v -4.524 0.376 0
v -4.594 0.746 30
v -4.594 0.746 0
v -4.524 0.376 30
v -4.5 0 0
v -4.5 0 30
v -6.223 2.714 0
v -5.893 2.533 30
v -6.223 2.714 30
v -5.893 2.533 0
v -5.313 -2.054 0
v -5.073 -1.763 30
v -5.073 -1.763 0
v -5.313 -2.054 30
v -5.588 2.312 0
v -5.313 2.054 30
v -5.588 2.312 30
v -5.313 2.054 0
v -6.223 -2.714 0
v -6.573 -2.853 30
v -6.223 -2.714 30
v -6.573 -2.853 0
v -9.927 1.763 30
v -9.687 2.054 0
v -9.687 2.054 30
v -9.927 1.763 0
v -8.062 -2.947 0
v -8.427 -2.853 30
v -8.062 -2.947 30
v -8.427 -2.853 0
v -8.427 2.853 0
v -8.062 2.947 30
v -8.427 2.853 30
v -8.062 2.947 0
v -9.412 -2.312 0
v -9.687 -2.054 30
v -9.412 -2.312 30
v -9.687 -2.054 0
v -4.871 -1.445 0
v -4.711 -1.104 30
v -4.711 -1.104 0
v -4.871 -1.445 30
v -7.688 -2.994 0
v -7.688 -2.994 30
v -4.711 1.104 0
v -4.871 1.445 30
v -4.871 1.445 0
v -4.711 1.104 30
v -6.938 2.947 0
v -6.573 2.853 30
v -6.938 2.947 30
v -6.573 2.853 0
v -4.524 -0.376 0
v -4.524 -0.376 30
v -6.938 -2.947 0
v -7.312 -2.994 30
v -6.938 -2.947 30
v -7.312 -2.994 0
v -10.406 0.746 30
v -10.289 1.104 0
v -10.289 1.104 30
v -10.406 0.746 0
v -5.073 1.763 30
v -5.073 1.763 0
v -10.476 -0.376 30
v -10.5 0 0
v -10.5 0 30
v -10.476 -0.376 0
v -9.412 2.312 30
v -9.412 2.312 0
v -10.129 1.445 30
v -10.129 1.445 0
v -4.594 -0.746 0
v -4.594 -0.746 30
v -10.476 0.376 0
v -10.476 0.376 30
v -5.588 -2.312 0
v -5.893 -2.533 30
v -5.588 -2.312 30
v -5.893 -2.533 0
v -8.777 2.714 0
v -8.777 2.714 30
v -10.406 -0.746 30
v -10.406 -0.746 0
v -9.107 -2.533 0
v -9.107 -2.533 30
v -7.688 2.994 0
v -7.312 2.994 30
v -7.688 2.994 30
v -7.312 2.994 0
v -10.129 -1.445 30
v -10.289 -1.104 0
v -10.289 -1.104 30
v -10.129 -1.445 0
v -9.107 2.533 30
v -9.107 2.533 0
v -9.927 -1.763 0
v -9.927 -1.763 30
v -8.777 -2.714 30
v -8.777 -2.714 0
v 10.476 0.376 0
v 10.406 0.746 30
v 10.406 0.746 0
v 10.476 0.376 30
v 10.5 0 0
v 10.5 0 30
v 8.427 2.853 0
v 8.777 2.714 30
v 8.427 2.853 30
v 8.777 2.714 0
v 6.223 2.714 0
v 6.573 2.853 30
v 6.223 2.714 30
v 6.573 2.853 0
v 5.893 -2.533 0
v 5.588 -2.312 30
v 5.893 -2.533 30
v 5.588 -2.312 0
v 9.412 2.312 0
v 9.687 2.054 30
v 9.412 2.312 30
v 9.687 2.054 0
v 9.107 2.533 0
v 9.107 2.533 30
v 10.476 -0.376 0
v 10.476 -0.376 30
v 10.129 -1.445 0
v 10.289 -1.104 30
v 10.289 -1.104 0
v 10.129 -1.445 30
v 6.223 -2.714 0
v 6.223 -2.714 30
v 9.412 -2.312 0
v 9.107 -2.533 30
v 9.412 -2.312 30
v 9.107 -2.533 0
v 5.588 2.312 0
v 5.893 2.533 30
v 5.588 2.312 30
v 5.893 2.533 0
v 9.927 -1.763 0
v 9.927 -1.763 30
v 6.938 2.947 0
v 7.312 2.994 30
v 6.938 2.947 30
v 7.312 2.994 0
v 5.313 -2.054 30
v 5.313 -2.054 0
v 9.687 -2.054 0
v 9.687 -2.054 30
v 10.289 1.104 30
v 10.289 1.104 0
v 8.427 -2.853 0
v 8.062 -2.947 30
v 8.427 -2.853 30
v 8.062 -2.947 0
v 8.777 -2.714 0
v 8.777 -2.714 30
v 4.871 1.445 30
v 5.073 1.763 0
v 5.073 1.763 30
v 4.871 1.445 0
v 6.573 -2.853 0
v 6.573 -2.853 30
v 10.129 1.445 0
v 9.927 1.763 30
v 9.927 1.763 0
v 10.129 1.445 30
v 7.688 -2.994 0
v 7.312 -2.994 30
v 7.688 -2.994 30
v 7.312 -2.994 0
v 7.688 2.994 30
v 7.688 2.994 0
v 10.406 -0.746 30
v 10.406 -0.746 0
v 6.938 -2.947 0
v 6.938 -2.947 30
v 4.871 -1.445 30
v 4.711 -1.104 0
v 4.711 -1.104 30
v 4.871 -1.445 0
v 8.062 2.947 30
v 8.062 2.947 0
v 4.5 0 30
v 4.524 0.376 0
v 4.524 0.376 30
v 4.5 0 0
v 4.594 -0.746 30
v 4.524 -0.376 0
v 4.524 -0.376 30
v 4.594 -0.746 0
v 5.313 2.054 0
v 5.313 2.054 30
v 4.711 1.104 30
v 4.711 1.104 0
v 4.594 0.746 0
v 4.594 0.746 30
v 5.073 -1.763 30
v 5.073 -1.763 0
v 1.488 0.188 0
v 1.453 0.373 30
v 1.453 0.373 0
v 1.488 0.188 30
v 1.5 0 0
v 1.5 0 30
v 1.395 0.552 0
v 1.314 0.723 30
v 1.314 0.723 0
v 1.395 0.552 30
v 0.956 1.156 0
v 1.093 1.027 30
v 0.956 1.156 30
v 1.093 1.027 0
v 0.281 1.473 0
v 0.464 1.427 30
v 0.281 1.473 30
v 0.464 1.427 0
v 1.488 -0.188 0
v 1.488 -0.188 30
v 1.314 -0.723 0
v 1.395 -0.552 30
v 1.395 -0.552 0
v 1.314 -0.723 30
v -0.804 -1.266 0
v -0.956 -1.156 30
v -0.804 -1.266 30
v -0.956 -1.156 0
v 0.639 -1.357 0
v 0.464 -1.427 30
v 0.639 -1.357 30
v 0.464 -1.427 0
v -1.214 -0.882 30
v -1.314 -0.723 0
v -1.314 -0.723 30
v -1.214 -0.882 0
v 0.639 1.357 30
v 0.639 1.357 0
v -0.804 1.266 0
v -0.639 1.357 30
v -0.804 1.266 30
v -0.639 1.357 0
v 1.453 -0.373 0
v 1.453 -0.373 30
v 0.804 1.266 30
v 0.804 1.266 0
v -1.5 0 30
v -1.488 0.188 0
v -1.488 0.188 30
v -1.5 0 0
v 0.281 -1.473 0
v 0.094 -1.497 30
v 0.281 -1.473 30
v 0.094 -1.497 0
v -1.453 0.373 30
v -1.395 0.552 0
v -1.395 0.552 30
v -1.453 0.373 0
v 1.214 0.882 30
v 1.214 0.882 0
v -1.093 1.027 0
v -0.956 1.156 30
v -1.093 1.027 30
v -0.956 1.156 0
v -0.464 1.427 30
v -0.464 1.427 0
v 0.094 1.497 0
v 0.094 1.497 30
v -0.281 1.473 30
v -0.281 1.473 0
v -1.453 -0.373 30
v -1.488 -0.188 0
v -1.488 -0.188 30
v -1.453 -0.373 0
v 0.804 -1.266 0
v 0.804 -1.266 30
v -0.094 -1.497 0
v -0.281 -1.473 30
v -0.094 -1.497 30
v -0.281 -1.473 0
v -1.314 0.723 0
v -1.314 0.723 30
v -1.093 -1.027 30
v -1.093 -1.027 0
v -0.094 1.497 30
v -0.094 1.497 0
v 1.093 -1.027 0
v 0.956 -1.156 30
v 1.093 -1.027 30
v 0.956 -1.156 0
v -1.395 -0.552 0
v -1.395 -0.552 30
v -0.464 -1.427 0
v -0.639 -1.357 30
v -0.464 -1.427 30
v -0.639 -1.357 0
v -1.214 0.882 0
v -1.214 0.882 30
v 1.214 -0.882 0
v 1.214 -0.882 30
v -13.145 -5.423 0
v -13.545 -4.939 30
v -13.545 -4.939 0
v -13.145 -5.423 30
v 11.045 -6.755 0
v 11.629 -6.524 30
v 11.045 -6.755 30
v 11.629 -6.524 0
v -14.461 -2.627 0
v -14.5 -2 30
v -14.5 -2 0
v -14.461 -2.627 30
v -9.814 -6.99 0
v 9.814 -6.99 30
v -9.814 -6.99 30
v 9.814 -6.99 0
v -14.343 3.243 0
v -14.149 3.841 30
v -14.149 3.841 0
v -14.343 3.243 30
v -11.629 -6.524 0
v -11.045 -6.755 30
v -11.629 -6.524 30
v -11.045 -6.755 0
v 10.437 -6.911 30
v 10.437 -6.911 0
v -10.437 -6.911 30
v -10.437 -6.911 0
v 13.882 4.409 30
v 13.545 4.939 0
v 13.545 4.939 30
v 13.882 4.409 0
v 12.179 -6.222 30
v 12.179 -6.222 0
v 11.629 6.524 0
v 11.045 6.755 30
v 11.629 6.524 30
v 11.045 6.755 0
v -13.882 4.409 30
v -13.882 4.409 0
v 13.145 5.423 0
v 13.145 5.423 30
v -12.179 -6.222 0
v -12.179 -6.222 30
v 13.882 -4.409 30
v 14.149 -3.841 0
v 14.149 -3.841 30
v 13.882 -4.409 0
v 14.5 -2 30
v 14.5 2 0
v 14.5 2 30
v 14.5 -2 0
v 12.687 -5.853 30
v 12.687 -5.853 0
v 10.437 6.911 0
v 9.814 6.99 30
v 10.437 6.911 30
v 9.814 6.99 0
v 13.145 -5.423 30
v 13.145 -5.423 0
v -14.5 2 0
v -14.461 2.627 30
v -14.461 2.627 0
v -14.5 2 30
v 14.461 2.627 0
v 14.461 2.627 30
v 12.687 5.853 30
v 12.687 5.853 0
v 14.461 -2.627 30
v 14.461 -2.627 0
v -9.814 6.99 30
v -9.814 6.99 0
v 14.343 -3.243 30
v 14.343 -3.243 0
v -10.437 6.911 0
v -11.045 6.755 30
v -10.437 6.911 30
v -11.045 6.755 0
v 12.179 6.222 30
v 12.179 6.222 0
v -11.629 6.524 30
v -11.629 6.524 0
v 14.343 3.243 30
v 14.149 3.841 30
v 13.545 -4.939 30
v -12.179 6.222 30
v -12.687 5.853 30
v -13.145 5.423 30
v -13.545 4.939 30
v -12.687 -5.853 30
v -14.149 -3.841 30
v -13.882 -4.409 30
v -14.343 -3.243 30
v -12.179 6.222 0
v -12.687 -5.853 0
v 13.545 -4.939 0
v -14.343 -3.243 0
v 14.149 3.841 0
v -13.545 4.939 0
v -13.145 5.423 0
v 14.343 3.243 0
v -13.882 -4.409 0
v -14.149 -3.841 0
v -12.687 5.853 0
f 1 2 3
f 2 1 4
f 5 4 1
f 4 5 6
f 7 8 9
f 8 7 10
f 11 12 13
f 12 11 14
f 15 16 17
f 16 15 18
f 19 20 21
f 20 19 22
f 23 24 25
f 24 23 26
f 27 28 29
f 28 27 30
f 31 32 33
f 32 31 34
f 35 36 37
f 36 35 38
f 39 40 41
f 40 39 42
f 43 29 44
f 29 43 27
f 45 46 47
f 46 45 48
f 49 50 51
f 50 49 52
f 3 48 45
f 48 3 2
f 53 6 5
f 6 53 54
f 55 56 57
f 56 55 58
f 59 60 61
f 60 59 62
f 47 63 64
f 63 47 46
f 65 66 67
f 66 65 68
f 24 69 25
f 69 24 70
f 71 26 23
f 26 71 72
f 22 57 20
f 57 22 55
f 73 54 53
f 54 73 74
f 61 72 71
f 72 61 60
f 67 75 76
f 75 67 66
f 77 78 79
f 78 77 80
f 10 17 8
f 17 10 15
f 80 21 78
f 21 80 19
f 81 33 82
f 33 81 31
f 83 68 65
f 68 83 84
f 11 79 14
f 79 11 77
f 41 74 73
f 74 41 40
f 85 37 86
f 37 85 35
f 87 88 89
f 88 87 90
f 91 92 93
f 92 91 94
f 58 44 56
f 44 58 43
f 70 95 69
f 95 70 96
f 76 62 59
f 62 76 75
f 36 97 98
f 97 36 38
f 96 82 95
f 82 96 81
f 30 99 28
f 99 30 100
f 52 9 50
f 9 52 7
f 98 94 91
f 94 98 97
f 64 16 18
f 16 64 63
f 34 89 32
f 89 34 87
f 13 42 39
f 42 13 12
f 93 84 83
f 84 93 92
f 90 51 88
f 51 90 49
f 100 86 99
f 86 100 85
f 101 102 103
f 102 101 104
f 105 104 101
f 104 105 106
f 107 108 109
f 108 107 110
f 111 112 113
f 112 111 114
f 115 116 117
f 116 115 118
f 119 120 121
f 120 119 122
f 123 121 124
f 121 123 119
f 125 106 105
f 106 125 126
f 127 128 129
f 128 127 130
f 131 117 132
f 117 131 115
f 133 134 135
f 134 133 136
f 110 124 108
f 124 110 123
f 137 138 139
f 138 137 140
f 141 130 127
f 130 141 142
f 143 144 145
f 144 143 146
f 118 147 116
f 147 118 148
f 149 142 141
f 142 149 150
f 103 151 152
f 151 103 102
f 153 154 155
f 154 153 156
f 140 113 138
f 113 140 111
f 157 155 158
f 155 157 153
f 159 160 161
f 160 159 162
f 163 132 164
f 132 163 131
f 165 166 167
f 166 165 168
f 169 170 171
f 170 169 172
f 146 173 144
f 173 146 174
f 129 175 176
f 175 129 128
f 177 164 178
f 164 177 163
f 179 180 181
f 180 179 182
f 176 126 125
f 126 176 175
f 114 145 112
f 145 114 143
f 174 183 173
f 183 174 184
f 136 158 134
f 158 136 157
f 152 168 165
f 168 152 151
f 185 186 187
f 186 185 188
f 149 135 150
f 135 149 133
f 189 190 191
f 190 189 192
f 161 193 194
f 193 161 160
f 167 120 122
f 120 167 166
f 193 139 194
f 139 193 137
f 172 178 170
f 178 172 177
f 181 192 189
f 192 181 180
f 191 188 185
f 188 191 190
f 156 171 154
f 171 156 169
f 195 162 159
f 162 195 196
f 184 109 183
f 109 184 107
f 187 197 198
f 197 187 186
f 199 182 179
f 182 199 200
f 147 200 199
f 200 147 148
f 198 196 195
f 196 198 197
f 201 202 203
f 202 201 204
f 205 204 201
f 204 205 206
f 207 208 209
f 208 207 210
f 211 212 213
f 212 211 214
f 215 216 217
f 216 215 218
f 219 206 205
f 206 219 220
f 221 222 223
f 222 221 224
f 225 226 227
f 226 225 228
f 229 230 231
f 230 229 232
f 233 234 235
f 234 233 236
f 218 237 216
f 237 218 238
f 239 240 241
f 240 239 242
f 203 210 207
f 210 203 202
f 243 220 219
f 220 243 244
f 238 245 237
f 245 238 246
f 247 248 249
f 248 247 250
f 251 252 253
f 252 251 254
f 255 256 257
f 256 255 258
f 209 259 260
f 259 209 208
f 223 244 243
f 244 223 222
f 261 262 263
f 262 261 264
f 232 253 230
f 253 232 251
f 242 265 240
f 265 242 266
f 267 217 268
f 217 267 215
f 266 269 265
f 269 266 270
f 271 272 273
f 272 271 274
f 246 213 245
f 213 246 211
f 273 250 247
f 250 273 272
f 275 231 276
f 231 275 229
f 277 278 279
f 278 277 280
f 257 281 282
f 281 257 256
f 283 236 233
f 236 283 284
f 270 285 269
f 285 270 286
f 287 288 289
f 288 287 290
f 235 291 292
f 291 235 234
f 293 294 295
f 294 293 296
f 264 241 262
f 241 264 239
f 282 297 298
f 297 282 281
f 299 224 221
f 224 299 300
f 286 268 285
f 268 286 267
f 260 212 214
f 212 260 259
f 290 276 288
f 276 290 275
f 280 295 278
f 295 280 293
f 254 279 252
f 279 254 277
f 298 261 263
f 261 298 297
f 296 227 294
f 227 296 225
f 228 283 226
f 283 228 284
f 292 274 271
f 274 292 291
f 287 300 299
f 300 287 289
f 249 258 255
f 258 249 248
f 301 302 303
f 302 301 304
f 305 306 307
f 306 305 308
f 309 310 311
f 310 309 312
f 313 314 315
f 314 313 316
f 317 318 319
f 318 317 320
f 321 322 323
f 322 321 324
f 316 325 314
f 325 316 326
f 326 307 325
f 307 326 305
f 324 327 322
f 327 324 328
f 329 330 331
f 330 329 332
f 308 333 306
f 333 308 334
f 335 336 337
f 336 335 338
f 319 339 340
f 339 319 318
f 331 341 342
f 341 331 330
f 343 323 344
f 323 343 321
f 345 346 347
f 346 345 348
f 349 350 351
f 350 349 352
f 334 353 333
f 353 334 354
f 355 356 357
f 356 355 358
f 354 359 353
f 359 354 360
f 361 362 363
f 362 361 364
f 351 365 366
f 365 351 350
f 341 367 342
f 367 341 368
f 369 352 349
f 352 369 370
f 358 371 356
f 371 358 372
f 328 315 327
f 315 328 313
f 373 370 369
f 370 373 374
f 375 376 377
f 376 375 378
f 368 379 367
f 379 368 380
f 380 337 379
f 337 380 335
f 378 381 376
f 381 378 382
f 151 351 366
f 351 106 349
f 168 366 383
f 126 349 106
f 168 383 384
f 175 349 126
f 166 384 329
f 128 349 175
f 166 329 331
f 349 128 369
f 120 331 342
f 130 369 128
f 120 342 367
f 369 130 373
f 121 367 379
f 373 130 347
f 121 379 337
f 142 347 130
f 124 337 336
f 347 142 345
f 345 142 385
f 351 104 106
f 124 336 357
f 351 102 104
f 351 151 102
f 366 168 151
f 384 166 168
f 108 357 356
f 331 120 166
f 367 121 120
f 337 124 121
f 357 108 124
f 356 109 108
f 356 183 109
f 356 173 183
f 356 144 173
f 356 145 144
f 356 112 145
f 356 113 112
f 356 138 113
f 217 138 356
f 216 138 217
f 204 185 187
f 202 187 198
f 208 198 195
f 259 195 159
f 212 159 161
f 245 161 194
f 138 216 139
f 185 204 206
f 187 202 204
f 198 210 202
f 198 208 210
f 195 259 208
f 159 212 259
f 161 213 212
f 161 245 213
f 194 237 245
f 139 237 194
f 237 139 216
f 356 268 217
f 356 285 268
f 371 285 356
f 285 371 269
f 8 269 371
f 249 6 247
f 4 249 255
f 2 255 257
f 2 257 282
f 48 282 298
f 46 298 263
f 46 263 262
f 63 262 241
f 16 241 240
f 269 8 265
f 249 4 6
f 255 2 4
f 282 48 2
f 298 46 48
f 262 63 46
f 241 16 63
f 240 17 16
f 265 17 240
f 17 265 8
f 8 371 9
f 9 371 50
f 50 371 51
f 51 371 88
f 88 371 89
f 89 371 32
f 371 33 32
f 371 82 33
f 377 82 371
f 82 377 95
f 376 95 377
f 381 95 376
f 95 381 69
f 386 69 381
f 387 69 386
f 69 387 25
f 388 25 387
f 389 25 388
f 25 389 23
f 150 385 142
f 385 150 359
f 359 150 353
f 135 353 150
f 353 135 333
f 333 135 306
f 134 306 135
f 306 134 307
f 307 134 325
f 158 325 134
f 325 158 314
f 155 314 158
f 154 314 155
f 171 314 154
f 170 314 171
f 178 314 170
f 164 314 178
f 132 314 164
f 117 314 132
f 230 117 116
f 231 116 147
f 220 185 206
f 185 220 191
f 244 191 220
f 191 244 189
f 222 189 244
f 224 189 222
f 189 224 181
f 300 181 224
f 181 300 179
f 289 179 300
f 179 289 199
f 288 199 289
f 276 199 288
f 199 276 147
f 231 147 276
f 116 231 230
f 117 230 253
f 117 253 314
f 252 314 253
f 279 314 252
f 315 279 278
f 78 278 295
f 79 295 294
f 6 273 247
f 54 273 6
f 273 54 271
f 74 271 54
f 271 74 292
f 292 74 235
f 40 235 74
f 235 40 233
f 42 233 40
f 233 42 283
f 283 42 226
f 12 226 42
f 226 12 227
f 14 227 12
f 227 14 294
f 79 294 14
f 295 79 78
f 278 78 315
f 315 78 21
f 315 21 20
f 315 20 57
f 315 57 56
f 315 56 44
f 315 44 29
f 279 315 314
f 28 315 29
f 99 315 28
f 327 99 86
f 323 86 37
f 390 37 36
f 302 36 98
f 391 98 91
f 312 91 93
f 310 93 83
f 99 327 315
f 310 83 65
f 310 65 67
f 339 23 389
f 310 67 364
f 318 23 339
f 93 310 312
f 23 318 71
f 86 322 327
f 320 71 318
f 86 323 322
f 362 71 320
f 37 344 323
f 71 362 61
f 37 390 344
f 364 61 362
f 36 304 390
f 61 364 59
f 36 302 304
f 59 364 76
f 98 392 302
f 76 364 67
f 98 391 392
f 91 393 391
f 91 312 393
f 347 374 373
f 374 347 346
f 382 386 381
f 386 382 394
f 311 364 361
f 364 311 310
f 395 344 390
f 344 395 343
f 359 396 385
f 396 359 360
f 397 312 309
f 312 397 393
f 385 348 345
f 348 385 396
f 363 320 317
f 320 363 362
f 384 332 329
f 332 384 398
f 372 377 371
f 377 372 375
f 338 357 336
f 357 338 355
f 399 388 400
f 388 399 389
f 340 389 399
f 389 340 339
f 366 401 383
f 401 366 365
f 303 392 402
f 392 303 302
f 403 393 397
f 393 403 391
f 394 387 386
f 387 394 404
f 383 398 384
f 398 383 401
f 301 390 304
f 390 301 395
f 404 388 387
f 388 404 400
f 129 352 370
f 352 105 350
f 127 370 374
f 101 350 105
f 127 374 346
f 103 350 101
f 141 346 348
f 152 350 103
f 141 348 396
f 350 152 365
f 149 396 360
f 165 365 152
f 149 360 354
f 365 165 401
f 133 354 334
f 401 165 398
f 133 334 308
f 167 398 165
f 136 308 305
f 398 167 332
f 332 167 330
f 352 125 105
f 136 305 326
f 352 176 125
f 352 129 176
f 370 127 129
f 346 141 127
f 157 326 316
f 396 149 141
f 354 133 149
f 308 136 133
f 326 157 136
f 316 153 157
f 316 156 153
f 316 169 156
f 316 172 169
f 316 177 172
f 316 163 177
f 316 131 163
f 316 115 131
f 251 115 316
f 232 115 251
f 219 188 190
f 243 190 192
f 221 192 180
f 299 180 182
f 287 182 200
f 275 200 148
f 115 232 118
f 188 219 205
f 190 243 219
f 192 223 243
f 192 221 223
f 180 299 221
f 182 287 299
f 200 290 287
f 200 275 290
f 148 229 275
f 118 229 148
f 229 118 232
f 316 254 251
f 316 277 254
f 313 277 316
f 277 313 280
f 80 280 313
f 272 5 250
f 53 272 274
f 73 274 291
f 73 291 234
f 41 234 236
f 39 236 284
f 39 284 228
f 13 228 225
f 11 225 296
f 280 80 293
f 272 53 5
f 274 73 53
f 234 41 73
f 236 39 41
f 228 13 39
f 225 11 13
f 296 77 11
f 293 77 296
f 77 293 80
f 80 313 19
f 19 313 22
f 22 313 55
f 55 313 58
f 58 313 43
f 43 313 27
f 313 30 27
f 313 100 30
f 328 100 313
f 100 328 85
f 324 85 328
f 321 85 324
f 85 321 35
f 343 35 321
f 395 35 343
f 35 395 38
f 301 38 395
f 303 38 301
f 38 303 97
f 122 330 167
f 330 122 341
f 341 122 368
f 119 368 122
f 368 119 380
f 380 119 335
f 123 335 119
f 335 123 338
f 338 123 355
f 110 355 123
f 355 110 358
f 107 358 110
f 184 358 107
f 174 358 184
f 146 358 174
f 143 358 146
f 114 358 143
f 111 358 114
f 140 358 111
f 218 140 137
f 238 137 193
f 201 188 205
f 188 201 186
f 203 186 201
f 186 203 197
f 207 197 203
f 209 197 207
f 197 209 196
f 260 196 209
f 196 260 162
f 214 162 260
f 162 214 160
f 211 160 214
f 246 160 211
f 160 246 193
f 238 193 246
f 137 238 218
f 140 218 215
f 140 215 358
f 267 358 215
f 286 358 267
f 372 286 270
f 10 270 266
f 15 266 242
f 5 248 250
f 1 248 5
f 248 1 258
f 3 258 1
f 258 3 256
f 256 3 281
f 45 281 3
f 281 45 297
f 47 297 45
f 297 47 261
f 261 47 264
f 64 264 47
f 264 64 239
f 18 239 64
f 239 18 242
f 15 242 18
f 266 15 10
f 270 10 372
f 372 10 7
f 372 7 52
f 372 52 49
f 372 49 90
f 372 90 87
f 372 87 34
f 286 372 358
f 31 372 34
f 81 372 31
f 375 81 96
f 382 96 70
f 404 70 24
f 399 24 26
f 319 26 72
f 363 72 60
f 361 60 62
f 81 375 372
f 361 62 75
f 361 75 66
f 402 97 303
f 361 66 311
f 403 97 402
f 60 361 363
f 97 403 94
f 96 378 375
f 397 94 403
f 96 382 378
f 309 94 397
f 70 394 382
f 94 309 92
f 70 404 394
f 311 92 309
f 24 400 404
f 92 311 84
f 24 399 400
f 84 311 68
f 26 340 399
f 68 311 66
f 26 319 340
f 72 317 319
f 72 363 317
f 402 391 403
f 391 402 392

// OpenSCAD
$fn = 50;


difference() {
	union() {
		*color(alpha = 1.0000000000, c = "gray") {
			translate(v = [0, 7, 0]) {
				linear_extrude(height = 1) {
					text(font = "Arial:style=Bold", halign = "center", size = 4.5000000000, text = "COMMENT plate main", valign = "center");
				}
			}
		}
		hull() {
			translate(v = [-9.5000000000, 2.0000000000, 0]) {
				cylinder(h = 30, r = 5);
			}
			translate(v = [9.5000000000, 2.0000000000, 0]) {
				cylinder(h = 30, r = 5);
			}
			translate(v = [-9.5000000000, -2.0000000000, 0]) {
				cylinder(h = 30, r = 5);
			}
			translate(v = [9.5000000000, -2.0000000000, 0]) {
				cylinder(h = 30, r = 5);
			}
		}
	}
	union() {
		*color(alpha = 1.0000000000, c = "gray") {
			translate(v = [0, 7, 0]) {
				linear_extrude(height = 1) {
					text(font = "Arial:style=Bold", halign = "center", size = 4.5000000000, text = "COMMENT holes main", valign = "center");
				}
			}
		}
		translate(v = [-7.5000000000, 0.0000000000, 0]) {
			translate(v = [0, 0, -100]) {
				cylinder(h = 200, r = 3.0000000000);
			}
		}
		translate(v = [7.5000000000, 0.0000000000, 0]) {
			translate(v = [0, 0, -100]) {
				cylinder(h = 200, r = 3.0000000000);
			}
		}
		translate(v = [-7.5000000000, 0.0000000000, 0]) {
			translate(v = [0, 0, -100]) {
				cylinder(h = 200, r = 1.5000000000);
			}
		}
		translate(v = [0, 0, -100]) {
			cylinder(h = 200, r = 1.5000000000);
		}
		translate(v = [7.5000000000, 0.0000000000, 0]) {
			translate(v = [0, 0, -100]) {
				cylinder(h = 200, r = 1.5000000000);
			}
		}
	}
}
